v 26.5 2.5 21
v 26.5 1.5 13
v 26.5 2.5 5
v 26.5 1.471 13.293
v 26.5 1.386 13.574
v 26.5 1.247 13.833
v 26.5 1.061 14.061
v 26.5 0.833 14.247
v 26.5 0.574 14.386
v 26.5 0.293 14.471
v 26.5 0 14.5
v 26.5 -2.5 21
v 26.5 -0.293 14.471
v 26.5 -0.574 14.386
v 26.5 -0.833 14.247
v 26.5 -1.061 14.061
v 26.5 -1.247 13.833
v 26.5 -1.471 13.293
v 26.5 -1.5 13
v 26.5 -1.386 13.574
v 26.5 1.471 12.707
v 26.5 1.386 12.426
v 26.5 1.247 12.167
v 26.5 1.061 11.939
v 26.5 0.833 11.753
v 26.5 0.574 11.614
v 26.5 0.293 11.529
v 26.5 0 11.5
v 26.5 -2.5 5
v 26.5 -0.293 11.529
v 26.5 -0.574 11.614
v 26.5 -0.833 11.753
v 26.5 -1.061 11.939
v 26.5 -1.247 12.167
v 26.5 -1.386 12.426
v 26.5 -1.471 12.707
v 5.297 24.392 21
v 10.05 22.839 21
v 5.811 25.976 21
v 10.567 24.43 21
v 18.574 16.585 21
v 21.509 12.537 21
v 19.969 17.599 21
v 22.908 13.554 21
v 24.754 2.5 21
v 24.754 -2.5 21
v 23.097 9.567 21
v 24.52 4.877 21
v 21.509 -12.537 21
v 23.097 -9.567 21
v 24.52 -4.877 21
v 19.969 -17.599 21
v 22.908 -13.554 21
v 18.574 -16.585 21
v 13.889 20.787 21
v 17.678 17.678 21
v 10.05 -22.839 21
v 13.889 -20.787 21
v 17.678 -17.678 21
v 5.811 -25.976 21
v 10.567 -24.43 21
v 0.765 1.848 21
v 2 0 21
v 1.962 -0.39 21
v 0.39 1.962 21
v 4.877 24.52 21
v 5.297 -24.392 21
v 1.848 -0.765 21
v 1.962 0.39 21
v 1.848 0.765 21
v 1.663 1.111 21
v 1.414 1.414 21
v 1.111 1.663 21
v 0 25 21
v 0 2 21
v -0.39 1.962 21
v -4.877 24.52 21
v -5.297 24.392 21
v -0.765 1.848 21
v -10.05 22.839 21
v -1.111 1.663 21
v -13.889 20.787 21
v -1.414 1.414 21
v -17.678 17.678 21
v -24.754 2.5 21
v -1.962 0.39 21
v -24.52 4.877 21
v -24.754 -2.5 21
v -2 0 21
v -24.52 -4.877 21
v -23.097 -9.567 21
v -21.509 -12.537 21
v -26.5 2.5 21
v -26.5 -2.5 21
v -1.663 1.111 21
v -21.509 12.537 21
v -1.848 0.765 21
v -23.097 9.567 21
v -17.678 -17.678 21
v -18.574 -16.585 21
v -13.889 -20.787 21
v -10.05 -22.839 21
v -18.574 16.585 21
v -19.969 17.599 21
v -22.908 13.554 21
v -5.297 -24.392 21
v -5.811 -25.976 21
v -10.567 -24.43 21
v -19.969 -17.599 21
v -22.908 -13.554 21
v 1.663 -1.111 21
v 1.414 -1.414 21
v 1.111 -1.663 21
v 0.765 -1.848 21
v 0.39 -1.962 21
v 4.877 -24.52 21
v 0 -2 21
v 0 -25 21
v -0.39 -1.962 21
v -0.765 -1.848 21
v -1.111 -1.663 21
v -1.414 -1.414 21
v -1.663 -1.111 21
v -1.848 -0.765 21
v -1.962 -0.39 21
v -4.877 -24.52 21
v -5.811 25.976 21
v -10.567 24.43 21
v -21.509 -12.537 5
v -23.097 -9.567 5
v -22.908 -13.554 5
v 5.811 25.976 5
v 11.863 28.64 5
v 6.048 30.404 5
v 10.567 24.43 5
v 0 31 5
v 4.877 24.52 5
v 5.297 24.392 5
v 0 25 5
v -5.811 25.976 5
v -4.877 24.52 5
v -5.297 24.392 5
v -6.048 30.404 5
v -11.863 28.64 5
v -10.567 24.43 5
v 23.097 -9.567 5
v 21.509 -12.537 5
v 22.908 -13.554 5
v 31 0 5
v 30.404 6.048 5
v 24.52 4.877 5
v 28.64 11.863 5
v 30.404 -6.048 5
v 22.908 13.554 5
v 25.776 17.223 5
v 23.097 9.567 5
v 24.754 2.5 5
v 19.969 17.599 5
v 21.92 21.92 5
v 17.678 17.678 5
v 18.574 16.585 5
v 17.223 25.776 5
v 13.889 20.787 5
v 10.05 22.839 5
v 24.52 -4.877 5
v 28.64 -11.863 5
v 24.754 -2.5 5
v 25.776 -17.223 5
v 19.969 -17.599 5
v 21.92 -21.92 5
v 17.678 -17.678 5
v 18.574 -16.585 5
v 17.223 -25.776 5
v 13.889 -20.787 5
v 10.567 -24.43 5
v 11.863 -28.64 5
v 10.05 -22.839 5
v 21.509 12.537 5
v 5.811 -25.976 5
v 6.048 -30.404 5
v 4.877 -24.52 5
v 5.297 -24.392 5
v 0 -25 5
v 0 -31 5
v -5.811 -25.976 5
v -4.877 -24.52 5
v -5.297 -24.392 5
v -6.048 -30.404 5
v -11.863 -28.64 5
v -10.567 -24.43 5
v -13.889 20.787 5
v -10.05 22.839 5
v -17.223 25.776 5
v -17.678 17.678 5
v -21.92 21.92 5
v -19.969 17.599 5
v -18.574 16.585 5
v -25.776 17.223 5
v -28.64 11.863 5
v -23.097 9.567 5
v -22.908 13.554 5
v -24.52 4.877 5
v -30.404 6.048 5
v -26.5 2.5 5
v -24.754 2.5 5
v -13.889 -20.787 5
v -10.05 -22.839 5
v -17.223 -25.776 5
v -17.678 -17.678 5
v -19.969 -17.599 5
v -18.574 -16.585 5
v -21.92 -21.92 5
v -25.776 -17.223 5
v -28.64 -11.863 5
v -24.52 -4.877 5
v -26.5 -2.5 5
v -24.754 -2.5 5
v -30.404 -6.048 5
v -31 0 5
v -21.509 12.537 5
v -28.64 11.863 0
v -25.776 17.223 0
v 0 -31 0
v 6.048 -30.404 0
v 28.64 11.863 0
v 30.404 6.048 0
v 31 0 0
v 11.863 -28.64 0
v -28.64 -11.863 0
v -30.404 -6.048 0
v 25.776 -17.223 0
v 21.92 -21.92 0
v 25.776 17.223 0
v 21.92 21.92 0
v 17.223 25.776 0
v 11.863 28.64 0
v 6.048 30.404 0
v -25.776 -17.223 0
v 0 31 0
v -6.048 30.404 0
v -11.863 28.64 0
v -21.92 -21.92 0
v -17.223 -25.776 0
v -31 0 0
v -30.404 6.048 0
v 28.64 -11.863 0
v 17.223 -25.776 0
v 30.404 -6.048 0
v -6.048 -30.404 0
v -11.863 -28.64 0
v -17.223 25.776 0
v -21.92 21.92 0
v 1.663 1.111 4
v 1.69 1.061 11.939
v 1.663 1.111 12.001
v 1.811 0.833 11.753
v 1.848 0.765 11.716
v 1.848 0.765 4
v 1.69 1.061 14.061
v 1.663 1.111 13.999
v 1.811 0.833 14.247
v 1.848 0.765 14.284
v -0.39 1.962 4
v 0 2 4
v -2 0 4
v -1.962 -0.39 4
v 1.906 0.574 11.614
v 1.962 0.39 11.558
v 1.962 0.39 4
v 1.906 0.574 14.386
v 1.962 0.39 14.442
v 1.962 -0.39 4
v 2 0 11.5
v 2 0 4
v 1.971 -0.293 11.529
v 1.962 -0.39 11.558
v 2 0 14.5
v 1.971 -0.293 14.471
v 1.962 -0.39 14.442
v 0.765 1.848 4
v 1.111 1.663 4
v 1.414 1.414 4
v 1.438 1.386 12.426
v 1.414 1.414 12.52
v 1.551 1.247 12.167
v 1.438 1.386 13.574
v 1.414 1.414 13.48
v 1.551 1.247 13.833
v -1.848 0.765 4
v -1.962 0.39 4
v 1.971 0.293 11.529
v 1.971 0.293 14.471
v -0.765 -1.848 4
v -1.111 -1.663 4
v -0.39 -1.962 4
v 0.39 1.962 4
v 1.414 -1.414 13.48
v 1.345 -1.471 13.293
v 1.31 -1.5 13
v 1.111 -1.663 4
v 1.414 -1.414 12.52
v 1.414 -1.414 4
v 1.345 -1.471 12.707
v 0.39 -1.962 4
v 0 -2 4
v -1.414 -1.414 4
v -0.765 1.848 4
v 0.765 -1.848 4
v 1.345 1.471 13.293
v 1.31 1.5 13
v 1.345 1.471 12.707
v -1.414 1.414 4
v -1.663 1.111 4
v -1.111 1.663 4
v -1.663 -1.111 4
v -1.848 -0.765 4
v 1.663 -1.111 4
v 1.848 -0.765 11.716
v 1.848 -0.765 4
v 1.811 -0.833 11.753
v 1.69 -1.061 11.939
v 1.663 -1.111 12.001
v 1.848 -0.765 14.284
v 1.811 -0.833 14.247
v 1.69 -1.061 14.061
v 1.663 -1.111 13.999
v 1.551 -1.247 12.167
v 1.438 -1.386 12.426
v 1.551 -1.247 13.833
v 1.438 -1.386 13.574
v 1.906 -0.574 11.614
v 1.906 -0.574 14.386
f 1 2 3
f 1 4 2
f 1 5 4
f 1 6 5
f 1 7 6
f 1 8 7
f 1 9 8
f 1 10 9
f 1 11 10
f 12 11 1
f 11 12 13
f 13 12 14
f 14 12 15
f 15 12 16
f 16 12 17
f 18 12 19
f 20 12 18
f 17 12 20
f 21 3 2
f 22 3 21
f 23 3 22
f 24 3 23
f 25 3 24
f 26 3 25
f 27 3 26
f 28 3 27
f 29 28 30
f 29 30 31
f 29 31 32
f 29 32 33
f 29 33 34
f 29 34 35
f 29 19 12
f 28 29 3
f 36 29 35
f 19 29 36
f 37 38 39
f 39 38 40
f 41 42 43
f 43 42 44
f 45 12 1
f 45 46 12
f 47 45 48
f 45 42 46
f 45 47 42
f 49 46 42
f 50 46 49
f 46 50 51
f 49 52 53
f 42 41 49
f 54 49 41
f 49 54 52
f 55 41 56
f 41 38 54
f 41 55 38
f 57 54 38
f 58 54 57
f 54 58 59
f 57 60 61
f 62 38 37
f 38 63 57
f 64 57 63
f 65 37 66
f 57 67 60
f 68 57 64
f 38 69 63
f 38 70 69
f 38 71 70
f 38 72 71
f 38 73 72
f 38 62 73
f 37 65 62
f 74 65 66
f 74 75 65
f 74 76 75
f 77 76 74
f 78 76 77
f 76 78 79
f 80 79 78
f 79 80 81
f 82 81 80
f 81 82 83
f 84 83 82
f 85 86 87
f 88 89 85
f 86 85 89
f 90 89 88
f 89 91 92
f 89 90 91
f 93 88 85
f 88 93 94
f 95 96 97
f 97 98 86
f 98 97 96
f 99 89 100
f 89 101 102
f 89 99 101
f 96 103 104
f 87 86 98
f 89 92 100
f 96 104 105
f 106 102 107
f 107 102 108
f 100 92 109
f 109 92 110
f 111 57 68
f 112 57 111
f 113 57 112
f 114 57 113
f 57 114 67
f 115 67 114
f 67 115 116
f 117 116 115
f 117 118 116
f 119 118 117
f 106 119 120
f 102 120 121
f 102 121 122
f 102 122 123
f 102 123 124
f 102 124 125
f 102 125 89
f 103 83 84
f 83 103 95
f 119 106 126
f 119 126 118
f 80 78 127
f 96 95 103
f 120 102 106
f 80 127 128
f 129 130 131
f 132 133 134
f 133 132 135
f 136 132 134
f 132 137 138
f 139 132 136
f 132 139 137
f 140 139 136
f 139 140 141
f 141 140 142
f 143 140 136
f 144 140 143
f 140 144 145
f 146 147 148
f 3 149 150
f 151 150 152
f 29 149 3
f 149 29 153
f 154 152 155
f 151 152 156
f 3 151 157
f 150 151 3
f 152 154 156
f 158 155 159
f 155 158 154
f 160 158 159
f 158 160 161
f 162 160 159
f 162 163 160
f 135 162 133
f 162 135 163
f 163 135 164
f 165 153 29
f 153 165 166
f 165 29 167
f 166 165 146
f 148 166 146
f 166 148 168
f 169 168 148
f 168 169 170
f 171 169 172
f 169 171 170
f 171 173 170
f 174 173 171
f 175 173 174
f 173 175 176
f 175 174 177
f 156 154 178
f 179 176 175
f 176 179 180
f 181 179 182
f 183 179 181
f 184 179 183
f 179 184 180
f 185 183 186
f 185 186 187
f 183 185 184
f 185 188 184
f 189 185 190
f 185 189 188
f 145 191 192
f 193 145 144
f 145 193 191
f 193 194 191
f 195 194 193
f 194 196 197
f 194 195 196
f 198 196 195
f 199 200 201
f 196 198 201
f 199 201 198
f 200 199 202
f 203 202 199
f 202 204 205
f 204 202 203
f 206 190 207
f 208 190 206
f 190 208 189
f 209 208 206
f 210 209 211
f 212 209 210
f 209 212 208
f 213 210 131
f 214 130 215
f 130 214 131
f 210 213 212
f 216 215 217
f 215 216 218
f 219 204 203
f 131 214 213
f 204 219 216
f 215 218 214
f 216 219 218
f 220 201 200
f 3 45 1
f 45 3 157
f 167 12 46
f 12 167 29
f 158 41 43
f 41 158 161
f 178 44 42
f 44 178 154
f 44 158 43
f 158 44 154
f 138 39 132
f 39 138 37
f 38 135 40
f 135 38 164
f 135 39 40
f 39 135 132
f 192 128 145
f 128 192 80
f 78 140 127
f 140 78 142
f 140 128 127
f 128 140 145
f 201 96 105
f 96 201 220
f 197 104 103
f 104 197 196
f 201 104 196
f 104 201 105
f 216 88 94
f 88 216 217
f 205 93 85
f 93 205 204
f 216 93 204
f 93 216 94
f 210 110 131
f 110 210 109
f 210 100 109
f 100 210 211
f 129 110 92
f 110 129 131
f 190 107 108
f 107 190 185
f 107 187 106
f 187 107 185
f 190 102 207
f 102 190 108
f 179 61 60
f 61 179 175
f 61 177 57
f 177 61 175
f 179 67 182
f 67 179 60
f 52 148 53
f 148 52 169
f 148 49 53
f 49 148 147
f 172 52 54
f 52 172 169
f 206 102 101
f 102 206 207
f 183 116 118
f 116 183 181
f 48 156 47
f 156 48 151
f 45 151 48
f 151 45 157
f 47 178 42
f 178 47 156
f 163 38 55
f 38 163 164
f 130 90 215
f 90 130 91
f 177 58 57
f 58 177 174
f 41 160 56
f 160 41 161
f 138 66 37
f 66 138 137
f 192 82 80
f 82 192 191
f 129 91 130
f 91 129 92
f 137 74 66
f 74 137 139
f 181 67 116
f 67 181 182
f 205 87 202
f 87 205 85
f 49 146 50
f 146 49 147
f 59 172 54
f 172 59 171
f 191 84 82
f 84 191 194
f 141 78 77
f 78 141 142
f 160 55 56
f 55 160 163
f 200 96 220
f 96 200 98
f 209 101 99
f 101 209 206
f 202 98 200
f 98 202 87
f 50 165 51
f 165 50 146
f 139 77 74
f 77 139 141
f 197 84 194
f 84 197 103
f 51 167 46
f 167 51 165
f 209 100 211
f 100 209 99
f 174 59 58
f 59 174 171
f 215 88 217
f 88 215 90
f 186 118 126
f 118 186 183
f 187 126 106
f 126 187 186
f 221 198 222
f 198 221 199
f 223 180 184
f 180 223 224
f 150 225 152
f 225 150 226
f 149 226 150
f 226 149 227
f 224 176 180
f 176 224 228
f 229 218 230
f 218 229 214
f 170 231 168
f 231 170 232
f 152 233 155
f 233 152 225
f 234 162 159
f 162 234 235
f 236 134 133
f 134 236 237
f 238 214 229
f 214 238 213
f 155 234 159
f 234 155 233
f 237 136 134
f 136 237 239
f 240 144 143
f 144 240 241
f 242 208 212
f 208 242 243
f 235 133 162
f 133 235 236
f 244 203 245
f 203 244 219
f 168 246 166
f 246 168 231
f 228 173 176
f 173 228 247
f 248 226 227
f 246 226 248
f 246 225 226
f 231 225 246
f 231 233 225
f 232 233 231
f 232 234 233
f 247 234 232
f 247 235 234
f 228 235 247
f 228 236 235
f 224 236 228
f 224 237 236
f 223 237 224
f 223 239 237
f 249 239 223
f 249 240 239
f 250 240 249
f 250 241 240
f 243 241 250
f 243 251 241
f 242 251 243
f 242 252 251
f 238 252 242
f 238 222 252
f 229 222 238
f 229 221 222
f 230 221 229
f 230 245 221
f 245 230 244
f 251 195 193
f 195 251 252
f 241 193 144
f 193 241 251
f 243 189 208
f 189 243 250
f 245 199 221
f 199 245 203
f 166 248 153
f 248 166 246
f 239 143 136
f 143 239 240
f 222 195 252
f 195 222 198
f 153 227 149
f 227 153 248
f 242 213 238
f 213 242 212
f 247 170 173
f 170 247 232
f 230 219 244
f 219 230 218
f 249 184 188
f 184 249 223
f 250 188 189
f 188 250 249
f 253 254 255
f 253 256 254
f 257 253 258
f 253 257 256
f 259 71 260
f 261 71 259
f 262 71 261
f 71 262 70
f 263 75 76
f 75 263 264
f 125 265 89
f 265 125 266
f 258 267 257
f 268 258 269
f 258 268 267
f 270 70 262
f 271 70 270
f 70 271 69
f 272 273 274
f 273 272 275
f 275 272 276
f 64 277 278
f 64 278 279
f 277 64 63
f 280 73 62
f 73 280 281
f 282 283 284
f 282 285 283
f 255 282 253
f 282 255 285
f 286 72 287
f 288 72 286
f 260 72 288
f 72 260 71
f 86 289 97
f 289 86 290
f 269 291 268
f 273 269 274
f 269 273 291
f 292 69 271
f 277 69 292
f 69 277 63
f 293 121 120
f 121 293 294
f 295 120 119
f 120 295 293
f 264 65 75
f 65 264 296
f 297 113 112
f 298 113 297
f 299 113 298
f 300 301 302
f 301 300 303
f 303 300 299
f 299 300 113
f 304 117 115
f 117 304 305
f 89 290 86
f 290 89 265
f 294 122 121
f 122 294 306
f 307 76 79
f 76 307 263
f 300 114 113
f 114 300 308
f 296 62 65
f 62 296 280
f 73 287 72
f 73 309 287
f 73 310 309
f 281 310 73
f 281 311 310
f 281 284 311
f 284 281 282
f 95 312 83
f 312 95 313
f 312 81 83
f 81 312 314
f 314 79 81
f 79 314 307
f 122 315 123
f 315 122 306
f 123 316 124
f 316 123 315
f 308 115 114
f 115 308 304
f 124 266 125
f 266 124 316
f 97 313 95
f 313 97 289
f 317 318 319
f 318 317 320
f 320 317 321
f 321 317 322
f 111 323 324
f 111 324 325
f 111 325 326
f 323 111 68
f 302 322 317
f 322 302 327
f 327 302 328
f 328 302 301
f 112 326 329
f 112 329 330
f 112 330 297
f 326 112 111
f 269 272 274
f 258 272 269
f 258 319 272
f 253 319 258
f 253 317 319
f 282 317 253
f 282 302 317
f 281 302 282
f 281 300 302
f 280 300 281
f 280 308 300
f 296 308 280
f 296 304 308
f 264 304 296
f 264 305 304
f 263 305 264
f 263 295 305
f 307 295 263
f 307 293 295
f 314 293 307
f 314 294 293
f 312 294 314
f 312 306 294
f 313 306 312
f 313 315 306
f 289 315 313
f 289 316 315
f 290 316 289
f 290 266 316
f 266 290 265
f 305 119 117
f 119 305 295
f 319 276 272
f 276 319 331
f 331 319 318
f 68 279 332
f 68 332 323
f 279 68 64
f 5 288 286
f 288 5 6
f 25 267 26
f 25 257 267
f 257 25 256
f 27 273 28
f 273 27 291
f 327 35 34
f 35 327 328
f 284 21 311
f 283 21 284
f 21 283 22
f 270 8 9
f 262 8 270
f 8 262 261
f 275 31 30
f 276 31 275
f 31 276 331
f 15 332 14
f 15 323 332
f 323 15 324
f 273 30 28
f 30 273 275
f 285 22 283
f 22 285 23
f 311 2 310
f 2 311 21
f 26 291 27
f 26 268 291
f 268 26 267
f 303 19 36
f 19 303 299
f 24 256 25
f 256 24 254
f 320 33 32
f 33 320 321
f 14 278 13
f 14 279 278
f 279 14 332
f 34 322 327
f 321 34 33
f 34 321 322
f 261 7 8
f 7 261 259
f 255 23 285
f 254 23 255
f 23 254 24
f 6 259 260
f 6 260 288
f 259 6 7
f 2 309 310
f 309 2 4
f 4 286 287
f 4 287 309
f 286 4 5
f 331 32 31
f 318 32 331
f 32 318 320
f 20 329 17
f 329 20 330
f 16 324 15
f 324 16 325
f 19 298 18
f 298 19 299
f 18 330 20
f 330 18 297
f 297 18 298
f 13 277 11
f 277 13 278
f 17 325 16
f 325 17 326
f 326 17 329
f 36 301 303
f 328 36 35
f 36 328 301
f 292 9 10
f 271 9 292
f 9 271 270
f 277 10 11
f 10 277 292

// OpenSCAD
$fn = 32;

// ----------------------------------------------------------------------
// Control knob: skirt knob with grip ribs
// ----------------------------------------------------------------------

// --- parameters (mm) ---
skirt_d = 62;             // skirt diameter
skirt_t = 5;              // skirt thickness
rib_w = 5;                // grip rib width
rib_out = 2.5;            // grip rib radial protrusion
n_ribs = 10;              // number of grip ribs
knob_d = 50;              // knob body diameter
knob_h = 16;              // knob body height
bore_d = 4;               // shaft bore diameter
set_d = 3;                // set screw bore diameter

rib_step = 360 / n_ribs;  // rib angular step
total_h = skirt_t + knob_h;  // overall height

difference() {
  union() {
    translate([0, 0, skirt_t]) cylinder(h = knob_h, d = knob_d);
    cylinder(h = skirt_t, d = skirt_d);
    for (i = [0 : n_ribs - 1])
      rotate([0, 0, i * rib_step])
        translate([knob_d / 2 - 1, -rib_w / 2, skirt_t])
          cube([rib_out, rib_w, knob_h]);
  }
  translate([0, 0, skirt_t - 1]) cylinder(h = knob_h + 2, d = bore_d);
  translate([-1, 0, skirt_t + knob_h / 2]) rotate([0, 90, 0])
    cylinder(h = knob_d / 2 + bore_d / 2 + 2, d = set_d);
}
